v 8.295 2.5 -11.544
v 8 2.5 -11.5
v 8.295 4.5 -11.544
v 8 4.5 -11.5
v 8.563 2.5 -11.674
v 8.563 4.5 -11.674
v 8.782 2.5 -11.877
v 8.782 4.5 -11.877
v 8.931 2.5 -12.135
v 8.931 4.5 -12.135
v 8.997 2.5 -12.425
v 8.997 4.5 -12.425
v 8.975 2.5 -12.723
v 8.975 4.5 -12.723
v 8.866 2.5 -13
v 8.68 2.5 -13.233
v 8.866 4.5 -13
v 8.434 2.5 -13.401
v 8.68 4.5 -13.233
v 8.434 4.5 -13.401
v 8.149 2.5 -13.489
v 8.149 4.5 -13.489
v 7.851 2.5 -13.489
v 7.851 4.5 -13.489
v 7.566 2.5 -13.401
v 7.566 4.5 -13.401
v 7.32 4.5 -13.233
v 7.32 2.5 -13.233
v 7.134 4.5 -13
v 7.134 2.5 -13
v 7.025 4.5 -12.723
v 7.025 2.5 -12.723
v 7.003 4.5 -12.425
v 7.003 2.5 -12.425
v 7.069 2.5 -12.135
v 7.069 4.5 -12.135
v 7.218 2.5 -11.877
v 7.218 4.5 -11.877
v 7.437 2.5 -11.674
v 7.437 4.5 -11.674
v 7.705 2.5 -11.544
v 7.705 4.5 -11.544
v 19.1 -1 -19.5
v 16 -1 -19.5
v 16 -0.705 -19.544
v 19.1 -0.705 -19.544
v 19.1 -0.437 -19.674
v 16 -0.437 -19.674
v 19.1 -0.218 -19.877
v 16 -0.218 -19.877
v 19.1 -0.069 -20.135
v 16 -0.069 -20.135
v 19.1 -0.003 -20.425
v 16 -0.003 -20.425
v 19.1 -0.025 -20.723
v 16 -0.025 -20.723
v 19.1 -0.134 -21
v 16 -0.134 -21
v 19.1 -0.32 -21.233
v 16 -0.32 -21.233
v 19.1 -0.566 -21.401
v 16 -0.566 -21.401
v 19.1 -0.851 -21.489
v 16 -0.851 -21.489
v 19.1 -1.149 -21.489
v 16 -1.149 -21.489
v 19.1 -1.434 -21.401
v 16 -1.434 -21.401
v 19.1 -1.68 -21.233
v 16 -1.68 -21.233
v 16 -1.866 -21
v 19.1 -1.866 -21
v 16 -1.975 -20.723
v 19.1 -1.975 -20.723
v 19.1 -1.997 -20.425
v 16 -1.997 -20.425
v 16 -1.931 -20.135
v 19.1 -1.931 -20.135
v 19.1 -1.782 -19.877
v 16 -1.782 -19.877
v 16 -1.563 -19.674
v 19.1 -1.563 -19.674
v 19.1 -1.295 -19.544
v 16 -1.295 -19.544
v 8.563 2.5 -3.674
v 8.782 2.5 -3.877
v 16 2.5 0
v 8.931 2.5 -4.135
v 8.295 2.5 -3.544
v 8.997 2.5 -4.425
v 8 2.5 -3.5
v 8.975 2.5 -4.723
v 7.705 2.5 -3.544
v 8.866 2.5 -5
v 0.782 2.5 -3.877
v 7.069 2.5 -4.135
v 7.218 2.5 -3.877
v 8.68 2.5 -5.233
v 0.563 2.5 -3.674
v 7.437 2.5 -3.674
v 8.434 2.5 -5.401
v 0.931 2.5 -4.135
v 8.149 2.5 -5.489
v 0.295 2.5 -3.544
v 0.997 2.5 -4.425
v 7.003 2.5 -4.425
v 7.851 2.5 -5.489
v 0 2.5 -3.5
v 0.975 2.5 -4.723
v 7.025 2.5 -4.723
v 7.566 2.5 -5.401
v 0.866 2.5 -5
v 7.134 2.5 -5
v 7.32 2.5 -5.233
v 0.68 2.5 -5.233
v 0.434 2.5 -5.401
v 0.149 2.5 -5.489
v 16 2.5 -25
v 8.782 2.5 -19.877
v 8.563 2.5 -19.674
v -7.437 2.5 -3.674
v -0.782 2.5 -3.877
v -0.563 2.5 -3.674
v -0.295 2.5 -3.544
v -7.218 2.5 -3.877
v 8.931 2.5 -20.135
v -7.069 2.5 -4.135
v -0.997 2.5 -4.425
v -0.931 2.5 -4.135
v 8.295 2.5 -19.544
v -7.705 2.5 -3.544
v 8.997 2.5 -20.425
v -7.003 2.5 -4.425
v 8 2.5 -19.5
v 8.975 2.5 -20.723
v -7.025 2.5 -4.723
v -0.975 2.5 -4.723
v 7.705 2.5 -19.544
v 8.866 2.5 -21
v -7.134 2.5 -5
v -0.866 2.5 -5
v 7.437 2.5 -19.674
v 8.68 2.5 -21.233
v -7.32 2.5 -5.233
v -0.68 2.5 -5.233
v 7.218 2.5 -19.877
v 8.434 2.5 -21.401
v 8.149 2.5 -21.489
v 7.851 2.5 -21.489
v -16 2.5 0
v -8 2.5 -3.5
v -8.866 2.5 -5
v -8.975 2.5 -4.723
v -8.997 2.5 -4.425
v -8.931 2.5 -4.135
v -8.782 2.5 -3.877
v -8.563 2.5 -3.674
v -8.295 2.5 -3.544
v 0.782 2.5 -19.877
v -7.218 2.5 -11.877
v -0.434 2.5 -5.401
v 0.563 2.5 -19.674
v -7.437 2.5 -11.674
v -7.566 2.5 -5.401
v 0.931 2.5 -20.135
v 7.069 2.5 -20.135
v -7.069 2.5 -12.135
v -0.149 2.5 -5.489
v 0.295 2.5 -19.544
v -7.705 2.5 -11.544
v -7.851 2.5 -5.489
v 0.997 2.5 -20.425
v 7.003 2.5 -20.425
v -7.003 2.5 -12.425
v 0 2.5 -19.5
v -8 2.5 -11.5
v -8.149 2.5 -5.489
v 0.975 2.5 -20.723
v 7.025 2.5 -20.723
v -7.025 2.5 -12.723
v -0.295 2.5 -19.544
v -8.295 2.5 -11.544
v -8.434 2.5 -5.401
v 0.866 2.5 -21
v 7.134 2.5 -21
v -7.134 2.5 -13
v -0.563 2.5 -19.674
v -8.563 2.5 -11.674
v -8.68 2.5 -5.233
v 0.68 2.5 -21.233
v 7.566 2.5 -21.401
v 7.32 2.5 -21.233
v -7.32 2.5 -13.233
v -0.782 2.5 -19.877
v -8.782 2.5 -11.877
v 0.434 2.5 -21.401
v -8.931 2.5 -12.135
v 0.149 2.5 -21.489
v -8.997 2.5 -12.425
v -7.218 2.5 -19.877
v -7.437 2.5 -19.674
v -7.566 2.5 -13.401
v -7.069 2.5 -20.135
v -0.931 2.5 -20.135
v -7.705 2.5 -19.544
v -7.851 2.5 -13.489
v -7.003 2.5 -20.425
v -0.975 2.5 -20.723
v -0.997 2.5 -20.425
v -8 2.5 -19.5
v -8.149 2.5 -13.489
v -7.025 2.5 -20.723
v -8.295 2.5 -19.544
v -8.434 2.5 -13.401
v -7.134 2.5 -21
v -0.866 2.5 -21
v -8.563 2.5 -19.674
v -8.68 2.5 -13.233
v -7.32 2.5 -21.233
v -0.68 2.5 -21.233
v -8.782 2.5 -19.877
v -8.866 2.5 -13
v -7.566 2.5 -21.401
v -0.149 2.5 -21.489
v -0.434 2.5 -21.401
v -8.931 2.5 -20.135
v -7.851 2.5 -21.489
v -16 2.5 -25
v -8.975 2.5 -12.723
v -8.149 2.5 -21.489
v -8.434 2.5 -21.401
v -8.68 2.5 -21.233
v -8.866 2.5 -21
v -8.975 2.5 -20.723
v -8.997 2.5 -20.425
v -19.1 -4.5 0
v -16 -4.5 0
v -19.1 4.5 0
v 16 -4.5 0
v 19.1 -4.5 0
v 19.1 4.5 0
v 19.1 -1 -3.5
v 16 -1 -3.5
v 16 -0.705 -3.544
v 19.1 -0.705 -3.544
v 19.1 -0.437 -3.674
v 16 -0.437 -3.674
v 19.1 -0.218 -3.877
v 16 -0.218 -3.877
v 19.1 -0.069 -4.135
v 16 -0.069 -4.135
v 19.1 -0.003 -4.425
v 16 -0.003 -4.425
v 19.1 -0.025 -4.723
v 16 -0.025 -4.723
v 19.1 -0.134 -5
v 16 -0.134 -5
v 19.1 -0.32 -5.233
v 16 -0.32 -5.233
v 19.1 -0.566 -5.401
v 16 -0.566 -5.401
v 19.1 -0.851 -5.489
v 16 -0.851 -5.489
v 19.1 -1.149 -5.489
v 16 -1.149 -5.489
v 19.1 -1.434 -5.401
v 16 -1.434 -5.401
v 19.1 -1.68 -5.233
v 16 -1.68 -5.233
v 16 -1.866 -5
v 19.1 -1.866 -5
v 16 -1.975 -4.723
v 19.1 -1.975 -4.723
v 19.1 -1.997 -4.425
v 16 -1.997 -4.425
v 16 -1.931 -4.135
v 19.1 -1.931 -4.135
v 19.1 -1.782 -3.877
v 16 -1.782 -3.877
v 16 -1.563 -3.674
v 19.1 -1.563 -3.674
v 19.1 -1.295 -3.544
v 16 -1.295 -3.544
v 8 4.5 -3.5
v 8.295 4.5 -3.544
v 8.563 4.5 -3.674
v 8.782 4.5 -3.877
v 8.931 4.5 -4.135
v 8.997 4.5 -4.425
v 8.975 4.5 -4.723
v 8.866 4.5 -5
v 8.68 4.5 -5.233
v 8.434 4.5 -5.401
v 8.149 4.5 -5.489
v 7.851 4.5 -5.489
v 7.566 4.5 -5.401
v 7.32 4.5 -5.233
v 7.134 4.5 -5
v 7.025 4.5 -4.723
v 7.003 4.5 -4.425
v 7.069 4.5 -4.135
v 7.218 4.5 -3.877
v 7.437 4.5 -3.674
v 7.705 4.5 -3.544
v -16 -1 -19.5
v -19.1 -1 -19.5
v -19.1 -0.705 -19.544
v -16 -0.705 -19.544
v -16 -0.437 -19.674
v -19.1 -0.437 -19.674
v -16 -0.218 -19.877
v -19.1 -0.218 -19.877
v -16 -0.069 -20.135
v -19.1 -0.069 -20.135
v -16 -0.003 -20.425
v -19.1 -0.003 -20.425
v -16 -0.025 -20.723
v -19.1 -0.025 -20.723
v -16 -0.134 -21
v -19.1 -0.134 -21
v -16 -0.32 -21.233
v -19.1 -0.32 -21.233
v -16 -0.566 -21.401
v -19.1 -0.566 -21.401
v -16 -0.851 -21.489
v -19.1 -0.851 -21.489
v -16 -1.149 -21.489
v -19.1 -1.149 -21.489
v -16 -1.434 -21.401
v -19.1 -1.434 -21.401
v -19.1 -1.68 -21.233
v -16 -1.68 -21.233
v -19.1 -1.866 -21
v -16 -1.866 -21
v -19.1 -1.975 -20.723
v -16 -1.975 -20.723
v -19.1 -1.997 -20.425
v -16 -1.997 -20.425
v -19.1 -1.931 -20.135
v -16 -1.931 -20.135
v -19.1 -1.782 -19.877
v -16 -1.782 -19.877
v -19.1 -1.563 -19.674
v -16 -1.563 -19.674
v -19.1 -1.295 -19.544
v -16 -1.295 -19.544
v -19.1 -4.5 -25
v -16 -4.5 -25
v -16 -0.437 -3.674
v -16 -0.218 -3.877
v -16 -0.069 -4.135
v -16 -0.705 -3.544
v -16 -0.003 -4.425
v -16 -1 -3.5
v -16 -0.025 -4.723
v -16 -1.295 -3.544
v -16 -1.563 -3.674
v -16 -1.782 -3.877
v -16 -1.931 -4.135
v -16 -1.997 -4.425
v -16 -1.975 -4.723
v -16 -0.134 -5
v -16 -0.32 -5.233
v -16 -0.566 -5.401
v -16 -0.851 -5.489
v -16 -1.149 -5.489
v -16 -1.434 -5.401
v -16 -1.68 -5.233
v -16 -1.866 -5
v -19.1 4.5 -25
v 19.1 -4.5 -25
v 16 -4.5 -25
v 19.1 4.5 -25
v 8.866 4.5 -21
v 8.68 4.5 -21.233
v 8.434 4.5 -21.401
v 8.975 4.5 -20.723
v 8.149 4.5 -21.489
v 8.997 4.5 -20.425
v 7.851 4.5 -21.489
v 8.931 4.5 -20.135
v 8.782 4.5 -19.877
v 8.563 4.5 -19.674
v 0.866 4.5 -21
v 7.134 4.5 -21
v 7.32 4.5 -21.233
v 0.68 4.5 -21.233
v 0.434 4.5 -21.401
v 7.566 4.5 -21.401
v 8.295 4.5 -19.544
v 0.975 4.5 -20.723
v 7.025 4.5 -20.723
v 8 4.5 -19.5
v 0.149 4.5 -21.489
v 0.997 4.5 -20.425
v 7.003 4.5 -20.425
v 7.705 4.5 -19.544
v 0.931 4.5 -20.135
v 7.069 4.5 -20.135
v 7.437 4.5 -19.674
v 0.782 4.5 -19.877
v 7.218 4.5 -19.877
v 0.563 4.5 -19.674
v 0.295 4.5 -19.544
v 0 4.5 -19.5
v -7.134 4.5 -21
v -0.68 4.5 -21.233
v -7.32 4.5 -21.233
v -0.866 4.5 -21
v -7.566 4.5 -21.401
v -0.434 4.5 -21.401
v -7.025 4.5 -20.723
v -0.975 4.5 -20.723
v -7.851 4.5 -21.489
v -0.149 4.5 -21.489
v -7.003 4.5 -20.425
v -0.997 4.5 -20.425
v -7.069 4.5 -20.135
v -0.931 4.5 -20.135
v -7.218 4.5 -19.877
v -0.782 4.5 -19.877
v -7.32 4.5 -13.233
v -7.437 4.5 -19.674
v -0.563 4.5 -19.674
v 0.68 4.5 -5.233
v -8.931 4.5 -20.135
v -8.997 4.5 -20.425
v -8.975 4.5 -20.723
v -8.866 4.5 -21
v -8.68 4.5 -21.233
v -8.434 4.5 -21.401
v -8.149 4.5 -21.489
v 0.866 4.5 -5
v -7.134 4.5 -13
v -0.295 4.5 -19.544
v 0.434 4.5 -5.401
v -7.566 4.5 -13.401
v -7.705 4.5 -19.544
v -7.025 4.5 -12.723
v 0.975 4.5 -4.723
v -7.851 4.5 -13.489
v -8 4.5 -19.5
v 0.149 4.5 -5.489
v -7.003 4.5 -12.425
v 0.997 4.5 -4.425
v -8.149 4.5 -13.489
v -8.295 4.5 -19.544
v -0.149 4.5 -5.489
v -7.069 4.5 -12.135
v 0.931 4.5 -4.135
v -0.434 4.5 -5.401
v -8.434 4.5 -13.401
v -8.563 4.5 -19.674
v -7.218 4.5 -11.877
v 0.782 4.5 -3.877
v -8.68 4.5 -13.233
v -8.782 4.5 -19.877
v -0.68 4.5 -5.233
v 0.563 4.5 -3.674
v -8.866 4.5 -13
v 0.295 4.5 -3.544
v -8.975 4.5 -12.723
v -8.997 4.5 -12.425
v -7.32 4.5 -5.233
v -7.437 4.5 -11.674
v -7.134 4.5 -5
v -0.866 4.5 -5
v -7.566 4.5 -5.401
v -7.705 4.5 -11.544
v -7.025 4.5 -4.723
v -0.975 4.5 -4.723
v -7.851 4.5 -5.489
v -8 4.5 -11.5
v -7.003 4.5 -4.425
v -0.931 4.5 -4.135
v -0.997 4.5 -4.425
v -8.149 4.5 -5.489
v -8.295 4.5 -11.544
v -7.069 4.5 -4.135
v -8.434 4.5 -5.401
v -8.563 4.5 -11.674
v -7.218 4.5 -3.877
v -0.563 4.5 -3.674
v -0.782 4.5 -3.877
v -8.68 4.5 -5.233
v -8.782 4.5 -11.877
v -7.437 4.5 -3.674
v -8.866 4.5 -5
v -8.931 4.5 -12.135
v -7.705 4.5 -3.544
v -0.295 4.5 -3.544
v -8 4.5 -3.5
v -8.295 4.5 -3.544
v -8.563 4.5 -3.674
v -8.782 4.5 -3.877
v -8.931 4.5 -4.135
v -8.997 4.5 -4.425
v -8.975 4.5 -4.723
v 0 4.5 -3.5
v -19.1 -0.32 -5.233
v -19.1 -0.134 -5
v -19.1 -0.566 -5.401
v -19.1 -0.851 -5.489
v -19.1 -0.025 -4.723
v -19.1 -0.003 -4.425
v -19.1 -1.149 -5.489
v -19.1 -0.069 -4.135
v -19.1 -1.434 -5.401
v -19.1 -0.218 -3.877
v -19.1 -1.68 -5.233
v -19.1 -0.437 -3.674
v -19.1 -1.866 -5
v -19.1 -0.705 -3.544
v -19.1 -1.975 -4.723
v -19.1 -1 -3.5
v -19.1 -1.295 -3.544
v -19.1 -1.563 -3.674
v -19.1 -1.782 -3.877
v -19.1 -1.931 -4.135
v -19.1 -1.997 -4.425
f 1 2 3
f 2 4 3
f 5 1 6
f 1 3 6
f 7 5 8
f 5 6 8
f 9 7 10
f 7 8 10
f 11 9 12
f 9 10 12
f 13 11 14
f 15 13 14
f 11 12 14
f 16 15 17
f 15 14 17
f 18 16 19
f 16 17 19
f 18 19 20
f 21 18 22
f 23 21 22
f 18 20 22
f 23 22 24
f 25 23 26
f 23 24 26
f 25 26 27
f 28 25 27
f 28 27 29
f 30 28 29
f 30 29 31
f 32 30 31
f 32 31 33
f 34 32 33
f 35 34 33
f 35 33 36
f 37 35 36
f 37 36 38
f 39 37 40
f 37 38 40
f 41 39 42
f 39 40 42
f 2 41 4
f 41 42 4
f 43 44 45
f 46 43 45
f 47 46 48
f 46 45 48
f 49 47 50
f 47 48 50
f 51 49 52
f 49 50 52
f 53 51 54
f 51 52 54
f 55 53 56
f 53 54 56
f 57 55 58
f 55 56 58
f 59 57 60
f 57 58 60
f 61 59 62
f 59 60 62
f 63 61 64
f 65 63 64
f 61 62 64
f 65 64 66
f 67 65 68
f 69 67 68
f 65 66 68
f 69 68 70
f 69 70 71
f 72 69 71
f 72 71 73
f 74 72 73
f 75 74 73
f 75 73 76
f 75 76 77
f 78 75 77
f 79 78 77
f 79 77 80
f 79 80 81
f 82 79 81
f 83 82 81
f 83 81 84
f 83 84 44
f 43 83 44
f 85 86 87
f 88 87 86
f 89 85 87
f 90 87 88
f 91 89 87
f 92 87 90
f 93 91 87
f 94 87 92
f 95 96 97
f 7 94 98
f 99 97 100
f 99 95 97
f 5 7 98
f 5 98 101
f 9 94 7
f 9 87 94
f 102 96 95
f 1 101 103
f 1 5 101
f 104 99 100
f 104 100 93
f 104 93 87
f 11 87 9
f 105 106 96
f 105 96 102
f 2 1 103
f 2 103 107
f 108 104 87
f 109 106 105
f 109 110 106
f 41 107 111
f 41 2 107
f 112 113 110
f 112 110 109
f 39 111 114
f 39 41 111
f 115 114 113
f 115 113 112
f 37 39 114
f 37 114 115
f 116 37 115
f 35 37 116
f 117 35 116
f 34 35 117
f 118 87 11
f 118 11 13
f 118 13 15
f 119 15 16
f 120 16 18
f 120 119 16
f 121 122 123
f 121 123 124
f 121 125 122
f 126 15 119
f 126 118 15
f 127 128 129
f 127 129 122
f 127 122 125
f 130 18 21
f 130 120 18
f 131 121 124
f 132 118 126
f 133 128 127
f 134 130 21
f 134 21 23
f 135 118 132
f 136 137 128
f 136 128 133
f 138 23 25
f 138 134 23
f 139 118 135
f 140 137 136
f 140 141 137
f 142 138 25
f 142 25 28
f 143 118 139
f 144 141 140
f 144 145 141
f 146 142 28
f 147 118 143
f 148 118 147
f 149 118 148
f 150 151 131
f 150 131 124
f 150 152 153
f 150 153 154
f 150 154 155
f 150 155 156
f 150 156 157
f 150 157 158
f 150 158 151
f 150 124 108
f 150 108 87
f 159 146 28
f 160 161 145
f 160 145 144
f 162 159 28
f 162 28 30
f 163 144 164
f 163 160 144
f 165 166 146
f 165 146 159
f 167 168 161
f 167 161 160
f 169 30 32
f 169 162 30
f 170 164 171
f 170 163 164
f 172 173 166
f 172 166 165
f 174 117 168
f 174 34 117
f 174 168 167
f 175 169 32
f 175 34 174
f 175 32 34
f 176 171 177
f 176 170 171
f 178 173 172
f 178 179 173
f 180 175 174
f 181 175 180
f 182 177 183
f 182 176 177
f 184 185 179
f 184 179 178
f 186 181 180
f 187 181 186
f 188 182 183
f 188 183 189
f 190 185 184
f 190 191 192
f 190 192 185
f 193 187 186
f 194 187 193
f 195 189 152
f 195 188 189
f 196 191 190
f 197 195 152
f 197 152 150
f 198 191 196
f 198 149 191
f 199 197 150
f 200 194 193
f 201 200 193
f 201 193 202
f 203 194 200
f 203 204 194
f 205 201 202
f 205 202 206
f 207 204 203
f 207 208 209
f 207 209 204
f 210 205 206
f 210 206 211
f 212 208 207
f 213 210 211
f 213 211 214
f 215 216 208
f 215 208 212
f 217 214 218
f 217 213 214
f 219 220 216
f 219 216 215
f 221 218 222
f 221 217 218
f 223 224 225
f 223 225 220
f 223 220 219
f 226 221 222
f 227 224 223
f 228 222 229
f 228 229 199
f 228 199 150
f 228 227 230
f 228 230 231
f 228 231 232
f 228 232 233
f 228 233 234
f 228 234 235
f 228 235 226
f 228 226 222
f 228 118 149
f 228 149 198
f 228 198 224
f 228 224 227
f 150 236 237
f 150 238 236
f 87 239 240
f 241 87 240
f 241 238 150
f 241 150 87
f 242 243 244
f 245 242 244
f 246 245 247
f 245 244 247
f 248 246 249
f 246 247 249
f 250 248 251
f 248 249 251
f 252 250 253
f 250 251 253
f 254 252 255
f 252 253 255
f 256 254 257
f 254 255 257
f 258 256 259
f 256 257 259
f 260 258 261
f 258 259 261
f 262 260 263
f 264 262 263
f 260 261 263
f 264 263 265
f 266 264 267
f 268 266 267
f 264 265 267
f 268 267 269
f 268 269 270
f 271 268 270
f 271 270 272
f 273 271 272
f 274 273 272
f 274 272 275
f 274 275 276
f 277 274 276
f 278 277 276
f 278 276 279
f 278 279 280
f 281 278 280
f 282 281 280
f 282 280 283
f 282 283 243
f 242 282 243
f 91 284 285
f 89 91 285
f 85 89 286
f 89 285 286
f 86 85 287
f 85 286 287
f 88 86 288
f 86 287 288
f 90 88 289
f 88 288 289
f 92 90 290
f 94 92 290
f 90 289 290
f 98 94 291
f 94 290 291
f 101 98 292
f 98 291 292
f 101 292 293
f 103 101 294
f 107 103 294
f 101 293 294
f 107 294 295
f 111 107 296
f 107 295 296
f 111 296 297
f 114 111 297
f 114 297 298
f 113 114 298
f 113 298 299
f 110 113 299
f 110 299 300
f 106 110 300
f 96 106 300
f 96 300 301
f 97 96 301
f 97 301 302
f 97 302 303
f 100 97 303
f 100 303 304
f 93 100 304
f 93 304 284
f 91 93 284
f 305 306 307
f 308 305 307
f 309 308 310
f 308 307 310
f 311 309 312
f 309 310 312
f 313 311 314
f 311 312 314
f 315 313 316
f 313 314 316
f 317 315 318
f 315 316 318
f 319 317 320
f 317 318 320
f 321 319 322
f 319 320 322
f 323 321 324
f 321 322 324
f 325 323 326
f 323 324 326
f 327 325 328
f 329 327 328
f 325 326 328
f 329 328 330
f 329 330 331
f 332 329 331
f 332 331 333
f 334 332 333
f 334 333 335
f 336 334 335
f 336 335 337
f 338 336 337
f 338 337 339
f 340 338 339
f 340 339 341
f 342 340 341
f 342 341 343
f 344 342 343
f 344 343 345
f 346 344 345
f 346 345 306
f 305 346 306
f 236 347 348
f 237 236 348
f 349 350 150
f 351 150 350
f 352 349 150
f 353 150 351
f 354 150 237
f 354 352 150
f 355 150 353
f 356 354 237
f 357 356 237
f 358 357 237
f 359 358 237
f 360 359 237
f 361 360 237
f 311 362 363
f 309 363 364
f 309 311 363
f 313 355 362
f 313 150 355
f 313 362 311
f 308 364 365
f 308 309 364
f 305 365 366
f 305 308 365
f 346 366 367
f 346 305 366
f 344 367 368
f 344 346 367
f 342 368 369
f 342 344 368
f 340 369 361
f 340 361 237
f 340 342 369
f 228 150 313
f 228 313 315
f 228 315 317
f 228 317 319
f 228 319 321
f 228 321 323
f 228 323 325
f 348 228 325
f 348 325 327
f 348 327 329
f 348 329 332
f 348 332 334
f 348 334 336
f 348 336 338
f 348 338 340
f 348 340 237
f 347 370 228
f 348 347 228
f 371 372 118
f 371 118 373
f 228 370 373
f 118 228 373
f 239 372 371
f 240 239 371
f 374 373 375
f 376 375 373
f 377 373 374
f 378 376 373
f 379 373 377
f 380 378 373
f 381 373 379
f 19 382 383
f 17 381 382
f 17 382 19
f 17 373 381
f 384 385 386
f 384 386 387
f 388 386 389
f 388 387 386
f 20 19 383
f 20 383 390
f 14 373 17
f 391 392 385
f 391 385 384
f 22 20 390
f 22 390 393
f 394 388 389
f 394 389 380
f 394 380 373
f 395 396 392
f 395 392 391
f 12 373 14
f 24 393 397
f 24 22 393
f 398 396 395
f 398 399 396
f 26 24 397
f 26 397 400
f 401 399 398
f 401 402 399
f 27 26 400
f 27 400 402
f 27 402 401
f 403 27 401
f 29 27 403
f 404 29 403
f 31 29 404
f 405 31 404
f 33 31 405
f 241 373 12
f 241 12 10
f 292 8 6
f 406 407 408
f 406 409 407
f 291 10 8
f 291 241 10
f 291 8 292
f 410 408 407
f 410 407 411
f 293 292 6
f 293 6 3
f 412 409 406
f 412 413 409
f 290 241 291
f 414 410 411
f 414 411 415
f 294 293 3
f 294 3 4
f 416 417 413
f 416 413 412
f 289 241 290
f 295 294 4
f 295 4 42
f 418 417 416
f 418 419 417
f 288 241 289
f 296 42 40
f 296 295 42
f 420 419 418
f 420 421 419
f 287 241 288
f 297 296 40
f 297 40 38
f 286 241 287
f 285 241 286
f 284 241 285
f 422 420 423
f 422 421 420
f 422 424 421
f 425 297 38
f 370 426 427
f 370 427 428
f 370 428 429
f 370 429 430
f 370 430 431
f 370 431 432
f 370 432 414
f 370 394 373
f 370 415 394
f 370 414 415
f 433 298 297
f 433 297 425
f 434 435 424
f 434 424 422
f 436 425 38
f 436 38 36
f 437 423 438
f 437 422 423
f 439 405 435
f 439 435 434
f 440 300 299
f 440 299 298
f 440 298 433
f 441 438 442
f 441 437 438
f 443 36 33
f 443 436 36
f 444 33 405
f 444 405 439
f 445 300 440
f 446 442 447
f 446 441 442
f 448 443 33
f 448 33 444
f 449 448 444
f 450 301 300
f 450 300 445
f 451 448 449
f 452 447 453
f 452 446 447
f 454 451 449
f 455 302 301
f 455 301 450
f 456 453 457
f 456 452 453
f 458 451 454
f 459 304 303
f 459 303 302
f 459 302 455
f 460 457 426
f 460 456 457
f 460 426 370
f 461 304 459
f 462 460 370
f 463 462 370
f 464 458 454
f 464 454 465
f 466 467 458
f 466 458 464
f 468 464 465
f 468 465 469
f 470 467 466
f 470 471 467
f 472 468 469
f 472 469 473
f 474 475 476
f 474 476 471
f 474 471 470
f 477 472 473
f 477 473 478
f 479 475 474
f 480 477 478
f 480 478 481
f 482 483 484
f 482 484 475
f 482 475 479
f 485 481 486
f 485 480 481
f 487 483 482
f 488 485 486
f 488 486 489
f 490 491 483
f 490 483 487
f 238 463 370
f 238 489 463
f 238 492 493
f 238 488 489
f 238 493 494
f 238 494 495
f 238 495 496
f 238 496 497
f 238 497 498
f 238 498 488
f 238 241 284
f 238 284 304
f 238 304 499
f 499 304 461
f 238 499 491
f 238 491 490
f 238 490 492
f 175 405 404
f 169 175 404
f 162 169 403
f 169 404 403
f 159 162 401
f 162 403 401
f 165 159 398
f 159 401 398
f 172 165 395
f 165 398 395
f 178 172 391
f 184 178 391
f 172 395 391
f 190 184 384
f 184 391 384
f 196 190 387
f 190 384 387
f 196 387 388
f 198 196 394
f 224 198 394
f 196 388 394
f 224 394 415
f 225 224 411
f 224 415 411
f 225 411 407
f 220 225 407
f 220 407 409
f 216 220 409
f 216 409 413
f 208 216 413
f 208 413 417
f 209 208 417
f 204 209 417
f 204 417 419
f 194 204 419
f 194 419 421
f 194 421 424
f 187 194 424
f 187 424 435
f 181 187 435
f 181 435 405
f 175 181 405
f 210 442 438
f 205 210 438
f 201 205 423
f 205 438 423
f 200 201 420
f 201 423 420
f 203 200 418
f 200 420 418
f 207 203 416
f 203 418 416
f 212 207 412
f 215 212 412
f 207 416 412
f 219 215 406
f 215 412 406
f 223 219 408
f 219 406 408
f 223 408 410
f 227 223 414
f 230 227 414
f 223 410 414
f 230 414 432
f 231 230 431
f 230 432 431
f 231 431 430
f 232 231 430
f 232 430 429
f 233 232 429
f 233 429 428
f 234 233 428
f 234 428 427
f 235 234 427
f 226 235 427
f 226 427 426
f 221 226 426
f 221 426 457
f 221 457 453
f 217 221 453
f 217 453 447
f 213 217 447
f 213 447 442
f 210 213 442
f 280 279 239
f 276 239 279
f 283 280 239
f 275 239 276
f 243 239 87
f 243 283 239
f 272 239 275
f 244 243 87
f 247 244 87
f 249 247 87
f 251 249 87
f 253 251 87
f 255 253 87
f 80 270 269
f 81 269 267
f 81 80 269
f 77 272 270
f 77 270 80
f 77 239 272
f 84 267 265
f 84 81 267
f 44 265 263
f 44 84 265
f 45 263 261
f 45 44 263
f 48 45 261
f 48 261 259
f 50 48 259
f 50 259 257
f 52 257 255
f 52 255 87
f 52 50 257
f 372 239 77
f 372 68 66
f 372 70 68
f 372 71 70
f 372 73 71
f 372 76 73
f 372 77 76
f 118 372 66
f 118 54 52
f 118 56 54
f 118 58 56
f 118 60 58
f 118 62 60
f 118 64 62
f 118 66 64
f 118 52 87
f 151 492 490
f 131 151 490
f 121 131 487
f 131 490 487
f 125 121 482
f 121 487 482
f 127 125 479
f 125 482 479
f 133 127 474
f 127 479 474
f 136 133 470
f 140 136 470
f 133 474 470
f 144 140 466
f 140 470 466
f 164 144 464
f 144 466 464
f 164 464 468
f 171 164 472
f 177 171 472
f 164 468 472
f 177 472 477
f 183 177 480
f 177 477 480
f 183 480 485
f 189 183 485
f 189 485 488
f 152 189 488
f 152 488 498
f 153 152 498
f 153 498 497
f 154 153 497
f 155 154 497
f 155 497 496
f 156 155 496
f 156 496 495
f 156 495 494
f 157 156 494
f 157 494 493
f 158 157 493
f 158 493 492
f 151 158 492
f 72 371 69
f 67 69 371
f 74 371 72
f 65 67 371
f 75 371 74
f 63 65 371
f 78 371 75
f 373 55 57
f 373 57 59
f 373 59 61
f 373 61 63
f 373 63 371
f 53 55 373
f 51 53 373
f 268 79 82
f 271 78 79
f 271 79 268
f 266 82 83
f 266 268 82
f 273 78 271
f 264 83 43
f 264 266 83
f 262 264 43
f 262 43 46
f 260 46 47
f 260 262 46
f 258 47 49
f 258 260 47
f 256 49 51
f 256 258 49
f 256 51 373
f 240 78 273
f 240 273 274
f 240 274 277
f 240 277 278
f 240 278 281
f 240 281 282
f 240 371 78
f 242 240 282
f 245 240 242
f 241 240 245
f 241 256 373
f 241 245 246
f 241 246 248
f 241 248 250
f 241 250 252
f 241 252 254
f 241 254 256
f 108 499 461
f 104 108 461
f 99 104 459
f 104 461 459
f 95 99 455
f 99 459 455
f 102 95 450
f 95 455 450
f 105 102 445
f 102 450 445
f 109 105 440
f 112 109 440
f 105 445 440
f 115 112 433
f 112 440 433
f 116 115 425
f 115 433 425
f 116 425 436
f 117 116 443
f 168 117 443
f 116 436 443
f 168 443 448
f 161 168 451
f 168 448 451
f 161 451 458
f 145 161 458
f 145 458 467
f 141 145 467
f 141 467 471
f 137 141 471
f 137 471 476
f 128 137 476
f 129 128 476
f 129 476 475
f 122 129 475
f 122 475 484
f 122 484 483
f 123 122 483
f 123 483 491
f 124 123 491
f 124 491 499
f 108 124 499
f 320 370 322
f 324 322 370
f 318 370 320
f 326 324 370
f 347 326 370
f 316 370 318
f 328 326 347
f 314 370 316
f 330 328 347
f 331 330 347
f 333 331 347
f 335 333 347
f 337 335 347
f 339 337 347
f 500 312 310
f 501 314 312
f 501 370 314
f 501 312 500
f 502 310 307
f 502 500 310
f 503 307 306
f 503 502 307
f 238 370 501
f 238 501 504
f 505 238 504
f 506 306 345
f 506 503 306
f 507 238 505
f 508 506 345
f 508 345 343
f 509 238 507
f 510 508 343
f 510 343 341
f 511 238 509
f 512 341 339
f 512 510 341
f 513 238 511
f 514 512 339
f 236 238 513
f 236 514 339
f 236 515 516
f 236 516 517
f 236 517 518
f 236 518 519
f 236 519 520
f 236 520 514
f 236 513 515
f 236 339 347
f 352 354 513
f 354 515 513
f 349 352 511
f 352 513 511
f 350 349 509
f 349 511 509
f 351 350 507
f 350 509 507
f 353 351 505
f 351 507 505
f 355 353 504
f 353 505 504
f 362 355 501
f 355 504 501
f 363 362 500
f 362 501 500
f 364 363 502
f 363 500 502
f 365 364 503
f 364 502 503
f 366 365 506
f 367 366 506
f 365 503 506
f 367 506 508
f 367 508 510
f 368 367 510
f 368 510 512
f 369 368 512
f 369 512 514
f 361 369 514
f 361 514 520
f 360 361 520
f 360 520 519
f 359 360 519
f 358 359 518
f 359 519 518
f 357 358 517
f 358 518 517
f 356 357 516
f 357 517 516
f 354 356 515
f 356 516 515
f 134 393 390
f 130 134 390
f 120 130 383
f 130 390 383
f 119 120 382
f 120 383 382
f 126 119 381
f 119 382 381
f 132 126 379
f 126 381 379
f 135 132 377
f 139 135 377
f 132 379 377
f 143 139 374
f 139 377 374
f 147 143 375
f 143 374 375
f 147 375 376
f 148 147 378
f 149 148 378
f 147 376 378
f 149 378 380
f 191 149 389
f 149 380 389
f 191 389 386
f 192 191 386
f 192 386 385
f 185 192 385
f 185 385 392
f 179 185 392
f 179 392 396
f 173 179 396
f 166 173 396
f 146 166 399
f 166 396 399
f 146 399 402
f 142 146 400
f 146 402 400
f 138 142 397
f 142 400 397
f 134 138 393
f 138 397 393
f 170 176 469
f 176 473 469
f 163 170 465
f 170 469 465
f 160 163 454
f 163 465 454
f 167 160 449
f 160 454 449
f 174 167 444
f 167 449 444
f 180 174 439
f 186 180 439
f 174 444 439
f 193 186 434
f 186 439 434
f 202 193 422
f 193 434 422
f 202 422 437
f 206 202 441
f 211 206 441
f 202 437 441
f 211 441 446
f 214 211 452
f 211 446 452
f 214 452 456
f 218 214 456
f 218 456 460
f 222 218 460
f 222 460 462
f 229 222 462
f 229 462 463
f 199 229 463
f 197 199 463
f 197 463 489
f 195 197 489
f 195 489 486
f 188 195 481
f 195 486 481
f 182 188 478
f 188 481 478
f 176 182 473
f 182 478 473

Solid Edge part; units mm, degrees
sketch "Sketch1" plane through (0, 0, 0) normal (0, 0, -1) x (-1, 0, 0)
  line L0 (19.1, -4.5) -> (-19.1, -4.5)
  line L1 (-19.1, -4.5) -> (-19.1, 4.5)
  line L2 (-19.1, 4.5) -> (19.1, 4.5)
  line L3 (19.1, 4.5) -> (19.1, -4.5)
  dimension "D1" = 9
  dimension "D2" = 38.2
extrude "Protrusion1" add sketch "Sketch1" along normal blind 25
sketch "Sketch2" plane through (0, 0, -25) normal (0, 0, -1) x (1, 0, 0)
  line L0 (-16, 4.5) -> (16, 4.5)
  line L1 (16, 4.5) -> (16, -2.5)
  line L2 (16, -2.5) -> (-16, -2.5)
  line L3 (-16, -2.5) -> (-16, 4.5)
  dimension "D1" = 32
  dimension "D2" = 7
extrude "Cutout1" cut sketch "Sketch2" against normal through all
hole "Hole_1" at (-19.1, -1, -4.5) direction (1, 0, 0) diameter 2 end through all
hole "Hole1" at (-19.1, -1, -20.5) direction (1, 0, 0) diameter 2 end through all
hole "Hole_3" at (0, 4.5, -20.5) direction (0, -1, 0) diameter 2 end through all
hole "Hole2" at (0, 4.5, -4.5) direction (0, -1, 0) diameter 2 end through all
hole "Hole3" at (-8, 4.5, -4.5) direction (0, -1, 0) diameter 2 end through all
hole "Hole4" at (-8, 4.5, -12.5) direction (0, -1, 0) diameter 2 end through all
hole "Hole5" at (-8, 4.5, -20.5) direction (0, -1, 0) diameter 2 end through all
hole "Hole6" at (8, 4.5, -20.5) direction (0, -1, 0) diameter 2 end through all
hole "Hole7" at (8, 4.5, -12.5) direction (0, -1, 0) diameter 2 end through all
hole "Hole8" at (8, 4.5, -4.5) direction (0, -1, 0) diameter 2 end through all
